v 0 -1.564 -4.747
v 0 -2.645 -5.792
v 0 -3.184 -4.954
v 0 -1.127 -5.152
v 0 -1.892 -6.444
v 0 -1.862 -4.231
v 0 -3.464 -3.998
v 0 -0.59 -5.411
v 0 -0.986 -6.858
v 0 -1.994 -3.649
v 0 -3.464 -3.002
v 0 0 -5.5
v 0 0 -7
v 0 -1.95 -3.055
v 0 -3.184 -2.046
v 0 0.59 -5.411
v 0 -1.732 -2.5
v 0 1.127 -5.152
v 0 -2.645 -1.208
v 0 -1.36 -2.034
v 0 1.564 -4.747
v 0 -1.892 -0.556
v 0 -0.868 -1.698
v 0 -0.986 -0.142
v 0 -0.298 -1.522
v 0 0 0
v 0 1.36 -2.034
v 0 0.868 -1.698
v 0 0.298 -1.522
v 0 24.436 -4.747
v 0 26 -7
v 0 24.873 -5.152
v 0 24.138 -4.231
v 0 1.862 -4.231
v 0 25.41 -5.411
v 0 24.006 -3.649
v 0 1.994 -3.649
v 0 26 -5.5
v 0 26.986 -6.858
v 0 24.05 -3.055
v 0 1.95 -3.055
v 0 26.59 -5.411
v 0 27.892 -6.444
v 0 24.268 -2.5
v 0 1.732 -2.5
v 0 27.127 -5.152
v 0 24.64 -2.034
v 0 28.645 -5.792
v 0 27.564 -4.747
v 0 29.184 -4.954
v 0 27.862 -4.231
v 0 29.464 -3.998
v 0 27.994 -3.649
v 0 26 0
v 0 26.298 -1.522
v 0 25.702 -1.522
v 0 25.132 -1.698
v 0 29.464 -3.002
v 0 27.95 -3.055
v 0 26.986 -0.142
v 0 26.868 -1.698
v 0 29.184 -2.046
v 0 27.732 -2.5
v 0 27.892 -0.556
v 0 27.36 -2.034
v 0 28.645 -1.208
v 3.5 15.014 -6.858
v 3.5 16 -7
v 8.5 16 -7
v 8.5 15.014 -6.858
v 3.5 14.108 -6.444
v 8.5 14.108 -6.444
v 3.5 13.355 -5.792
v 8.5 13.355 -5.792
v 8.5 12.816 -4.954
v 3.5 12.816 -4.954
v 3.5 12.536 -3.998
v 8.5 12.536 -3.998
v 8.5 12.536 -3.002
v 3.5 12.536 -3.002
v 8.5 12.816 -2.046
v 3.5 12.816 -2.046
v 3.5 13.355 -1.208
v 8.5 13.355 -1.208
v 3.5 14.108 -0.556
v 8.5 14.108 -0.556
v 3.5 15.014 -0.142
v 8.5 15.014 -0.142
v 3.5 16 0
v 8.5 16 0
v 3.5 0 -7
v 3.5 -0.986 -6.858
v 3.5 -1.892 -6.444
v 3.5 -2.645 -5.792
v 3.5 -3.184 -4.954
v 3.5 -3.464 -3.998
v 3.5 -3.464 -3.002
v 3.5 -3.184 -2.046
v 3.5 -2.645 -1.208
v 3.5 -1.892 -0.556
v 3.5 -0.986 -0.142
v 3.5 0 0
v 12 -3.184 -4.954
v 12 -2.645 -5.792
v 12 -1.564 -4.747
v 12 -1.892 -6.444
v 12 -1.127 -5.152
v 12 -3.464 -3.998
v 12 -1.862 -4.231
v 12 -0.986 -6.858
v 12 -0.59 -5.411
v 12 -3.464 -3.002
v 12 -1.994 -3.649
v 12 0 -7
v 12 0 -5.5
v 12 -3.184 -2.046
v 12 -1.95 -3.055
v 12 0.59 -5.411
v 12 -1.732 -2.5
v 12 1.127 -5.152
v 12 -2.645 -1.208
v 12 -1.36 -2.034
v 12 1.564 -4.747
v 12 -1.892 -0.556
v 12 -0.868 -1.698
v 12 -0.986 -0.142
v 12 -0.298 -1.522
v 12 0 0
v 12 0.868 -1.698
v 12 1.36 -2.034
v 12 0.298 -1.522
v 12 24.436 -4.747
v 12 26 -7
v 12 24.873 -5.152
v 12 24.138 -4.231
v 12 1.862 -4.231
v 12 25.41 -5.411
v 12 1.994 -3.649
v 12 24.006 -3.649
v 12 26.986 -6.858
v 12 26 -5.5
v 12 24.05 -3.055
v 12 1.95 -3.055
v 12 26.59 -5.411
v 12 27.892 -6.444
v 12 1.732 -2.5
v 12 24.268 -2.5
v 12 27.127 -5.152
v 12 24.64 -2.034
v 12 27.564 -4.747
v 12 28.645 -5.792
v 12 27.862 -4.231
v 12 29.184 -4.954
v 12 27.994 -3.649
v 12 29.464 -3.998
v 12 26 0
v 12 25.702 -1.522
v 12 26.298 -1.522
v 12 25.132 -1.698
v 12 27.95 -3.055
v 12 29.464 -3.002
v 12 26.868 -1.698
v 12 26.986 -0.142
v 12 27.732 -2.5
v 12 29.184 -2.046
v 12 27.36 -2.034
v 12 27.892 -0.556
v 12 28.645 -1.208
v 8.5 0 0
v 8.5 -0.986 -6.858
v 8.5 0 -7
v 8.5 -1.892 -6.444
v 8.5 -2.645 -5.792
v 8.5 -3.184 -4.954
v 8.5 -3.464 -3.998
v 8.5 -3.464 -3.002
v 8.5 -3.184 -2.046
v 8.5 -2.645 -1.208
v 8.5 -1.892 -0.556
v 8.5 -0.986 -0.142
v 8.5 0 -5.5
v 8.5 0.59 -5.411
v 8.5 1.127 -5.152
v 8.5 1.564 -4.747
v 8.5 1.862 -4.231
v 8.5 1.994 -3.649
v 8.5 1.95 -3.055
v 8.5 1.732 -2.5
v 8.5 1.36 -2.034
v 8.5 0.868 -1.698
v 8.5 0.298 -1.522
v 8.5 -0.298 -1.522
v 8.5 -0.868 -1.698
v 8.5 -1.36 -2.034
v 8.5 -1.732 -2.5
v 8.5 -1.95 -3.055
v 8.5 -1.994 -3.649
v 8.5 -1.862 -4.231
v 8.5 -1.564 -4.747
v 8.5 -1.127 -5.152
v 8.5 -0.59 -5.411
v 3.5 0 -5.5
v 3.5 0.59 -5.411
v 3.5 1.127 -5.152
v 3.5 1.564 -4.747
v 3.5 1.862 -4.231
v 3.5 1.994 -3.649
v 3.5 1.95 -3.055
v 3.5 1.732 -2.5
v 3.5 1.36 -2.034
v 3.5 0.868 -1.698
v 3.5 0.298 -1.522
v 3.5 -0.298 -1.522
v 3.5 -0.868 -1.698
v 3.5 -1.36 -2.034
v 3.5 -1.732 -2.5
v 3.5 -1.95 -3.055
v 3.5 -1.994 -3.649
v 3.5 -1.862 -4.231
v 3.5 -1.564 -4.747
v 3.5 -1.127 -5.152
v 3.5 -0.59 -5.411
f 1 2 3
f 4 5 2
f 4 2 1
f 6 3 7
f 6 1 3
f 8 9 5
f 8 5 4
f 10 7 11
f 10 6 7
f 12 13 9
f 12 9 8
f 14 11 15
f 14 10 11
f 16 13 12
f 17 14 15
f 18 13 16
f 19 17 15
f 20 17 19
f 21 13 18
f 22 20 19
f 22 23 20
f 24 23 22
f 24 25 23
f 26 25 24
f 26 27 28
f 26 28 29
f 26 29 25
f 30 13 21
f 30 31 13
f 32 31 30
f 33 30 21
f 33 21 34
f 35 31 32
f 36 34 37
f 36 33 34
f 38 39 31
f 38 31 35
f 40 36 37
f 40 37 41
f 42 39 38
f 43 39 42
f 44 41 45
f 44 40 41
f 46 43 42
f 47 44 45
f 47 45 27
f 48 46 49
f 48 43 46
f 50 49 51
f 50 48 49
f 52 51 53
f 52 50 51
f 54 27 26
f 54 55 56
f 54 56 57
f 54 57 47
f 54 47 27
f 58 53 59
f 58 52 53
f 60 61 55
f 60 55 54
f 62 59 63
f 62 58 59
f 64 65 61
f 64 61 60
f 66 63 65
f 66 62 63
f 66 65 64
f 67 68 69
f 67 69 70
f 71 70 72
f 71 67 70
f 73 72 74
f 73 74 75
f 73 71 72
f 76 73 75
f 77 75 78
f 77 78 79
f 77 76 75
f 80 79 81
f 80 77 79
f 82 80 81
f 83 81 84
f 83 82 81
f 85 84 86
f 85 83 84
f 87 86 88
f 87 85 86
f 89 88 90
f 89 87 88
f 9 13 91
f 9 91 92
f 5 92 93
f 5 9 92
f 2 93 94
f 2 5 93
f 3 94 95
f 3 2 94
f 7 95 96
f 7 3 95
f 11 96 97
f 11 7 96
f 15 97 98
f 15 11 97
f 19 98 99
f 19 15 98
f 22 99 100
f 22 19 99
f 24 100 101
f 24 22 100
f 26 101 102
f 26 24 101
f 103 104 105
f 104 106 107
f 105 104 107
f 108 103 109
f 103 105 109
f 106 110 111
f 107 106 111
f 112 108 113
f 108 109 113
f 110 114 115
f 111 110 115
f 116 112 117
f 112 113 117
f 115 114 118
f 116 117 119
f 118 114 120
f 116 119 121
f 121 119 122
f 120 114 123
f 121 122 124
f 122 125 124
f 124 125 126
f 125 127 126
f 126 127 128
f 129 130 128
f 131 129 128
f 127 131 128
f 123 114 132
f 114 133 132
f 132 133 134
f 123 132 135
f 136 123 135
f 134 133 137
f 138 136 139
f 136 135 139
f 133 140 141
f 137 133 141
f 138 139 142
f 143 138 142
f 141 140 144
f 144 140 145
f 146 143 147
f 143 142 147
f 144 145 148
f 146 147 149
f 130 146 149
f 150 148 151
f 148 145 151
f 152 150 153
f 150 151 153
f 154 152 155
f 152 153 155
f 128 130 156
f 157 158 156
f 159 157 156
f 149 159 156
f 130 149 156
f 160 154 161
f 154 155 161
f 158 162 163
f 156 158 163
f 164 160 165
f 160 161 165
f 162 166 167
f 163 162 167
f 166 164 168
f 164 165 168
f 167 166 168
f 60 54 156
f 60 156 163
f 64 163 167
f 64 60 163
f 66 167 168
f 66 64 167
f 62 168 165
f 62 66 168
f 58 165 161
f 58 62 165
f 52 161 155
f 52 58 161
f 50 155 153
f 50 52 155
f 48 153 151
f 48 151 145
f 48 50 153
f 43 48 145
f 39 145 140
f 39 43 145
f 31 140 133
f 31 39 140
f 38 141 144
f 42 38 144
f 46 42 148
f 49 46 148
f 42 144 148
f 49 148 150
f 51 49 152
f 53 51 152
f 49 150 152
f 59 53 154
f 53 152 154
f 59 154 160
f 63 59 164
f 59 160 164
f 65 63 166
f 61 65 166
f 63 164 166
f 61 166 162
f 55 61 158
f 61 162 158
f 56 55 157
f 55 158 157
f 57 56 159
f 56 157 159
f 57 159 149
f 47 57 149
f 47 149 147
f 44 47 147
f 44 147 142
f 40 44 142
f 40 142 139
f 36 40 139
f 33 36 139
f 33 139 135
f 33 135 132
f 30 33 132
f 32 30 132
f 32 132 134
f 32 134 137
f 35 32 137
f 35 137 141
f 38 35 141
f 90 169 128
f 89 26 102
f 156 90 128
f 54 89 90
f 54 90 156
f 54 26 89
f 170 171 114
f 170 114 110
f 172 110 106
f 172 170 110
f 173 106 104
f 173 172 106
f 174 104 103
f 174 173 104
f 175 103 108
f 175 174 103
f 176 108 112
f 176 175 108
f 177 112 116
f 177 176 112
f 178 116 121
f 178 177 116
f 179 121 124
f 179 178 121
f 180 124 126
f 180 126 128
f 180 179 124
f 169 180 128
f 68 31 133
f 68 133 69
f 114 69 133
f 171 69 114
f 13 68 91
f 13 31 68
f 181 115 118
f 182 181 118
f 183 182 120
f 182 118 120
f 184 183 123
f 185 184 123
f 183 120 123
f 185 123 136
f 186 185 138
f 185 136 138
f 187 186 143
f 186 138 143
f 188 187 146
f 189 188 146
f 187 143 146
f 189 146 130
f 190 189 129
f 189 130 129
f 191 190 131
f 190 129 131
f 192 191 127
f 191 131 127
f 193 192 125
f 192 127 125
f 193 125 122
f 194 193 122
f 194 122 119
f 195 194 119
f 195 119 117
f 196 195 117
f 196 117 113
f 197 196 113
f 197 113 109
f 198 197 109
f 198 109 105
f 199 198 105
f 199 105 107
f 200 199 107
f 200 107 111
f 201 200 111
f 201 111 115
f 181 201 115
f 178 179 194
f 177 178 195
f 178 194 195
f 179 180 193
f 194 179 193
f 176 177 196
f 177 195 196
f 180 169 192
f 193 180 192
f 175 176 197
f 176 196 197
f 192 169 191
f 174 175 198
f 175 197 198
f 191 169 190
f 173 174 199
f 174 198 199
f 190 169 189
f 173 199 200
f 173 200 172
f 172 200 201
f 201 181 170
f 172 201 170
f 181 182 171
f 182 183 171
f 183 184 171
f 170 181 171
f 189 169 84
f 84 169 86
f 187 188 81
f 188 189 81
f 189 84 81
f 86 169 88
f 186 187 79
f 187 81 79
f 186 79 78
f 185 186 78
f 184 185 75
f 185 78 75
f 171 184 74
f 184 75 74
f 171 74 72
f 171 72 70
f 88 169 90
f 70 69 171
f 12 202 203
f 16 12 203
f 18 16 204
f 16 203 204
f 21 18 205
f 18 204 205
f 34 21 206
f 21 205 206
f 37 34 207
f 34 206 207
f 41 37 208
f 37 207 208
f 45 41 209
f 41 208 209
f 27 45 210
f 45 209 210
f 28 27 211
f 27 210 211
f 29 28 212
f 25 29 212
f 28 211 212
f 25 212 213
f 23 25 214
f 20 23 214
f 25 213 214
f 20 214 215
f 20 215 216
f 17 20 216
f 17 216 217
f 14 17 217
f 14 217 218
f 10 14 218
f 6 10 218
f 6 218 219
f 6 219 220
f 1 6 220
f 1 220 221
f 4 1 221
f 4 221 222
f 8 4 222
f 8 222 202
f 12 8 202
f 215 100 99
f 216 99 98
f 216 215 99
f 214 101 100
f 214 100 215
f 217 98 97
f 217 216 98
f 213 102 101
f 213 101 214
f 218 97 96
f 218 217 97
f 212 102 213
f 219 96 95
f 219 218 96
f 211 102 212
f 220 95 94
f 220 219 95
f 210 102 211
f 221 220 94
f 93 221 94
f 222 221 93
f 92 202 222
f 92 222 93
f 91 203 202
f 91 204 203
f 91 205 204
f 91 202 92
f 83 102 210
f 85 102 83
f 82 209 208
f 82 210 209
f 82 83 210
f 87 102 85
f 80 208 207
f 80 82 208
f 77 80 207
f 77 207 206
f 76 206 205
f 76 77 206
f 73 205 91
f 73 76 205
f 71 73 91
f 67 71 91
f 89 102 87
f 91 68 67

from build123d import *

# Parameters (mm, degrees)
EXTRUDE_1_DEPTH     = 12
SKETCH_2_R          = 2
CUT_EXTRUDE_2_DEPTH = 15
CUT_EXTRUDE_3_DEPTH = 5


with BuildPart() as part:
    # Эскиз1 → Бобышка-Вытянуть1 (new body)
    with BuildSketch(Plane(origin=(0, 0, 0), x_dir=(0, 0, -1), z_dir=(1, 0, 0))):
        with BuildLine():
            Line((0, 0), (0, 26))
            ThreePointArc((0, 26), (3.5, 29.5), (7, 26))
            Line((7, 26), (7, 0))
            ThreePointArc((7, 0), (3.5, -3.5), (0, 0))
        make_face()
    extrude(amount=EXTRUDE_1_DEPTH)

    # Эскиз2 → Вырез-Вытянуть2 (cut)
    with BuildSketch(Plane(origin=(12, 0, 0), x_dir=(0, 0, -1), z_dir=(1, 0, 0))):
        with Locations((3.5, 0)):
            Circle(SKETCH_2_R)
        with Locations((3.5, 26)):
            Circle(SKETCH_2_R)
    extrude(amount=-CUT_EXTRUDE_2_DEPTH, mode=Mode.SUBTRACT)

    # Эскиз3 → Вырез-Вытянуть3 (cut)
    with BuildSketch(Plane(origin=(3.5, 0, 0), x_dir=(0, 0, -1), z_dir=(1, 0, 0))):
        with BuildLine():
            Line((0, 16), (-8.33598626, 16))
            Line((-8.33598626, 16), (-8.33598626, -12.274921498))
            Line((-8.33598626, -12.274921498), (16.66401374, -12.274921498))
            Line((16.66401374, -12.274921498), (16.66401374, 16))
            Line((16.66401374, 16), (7, 16))
            ThreePointArc((7, 16), (3.5, 12.5), (0, 16))
        make_face()
    extrude(amount=CUT_EXTRUDE_3_DEPTH, mode=Mode.SUBTRACT)


solid = part.part
